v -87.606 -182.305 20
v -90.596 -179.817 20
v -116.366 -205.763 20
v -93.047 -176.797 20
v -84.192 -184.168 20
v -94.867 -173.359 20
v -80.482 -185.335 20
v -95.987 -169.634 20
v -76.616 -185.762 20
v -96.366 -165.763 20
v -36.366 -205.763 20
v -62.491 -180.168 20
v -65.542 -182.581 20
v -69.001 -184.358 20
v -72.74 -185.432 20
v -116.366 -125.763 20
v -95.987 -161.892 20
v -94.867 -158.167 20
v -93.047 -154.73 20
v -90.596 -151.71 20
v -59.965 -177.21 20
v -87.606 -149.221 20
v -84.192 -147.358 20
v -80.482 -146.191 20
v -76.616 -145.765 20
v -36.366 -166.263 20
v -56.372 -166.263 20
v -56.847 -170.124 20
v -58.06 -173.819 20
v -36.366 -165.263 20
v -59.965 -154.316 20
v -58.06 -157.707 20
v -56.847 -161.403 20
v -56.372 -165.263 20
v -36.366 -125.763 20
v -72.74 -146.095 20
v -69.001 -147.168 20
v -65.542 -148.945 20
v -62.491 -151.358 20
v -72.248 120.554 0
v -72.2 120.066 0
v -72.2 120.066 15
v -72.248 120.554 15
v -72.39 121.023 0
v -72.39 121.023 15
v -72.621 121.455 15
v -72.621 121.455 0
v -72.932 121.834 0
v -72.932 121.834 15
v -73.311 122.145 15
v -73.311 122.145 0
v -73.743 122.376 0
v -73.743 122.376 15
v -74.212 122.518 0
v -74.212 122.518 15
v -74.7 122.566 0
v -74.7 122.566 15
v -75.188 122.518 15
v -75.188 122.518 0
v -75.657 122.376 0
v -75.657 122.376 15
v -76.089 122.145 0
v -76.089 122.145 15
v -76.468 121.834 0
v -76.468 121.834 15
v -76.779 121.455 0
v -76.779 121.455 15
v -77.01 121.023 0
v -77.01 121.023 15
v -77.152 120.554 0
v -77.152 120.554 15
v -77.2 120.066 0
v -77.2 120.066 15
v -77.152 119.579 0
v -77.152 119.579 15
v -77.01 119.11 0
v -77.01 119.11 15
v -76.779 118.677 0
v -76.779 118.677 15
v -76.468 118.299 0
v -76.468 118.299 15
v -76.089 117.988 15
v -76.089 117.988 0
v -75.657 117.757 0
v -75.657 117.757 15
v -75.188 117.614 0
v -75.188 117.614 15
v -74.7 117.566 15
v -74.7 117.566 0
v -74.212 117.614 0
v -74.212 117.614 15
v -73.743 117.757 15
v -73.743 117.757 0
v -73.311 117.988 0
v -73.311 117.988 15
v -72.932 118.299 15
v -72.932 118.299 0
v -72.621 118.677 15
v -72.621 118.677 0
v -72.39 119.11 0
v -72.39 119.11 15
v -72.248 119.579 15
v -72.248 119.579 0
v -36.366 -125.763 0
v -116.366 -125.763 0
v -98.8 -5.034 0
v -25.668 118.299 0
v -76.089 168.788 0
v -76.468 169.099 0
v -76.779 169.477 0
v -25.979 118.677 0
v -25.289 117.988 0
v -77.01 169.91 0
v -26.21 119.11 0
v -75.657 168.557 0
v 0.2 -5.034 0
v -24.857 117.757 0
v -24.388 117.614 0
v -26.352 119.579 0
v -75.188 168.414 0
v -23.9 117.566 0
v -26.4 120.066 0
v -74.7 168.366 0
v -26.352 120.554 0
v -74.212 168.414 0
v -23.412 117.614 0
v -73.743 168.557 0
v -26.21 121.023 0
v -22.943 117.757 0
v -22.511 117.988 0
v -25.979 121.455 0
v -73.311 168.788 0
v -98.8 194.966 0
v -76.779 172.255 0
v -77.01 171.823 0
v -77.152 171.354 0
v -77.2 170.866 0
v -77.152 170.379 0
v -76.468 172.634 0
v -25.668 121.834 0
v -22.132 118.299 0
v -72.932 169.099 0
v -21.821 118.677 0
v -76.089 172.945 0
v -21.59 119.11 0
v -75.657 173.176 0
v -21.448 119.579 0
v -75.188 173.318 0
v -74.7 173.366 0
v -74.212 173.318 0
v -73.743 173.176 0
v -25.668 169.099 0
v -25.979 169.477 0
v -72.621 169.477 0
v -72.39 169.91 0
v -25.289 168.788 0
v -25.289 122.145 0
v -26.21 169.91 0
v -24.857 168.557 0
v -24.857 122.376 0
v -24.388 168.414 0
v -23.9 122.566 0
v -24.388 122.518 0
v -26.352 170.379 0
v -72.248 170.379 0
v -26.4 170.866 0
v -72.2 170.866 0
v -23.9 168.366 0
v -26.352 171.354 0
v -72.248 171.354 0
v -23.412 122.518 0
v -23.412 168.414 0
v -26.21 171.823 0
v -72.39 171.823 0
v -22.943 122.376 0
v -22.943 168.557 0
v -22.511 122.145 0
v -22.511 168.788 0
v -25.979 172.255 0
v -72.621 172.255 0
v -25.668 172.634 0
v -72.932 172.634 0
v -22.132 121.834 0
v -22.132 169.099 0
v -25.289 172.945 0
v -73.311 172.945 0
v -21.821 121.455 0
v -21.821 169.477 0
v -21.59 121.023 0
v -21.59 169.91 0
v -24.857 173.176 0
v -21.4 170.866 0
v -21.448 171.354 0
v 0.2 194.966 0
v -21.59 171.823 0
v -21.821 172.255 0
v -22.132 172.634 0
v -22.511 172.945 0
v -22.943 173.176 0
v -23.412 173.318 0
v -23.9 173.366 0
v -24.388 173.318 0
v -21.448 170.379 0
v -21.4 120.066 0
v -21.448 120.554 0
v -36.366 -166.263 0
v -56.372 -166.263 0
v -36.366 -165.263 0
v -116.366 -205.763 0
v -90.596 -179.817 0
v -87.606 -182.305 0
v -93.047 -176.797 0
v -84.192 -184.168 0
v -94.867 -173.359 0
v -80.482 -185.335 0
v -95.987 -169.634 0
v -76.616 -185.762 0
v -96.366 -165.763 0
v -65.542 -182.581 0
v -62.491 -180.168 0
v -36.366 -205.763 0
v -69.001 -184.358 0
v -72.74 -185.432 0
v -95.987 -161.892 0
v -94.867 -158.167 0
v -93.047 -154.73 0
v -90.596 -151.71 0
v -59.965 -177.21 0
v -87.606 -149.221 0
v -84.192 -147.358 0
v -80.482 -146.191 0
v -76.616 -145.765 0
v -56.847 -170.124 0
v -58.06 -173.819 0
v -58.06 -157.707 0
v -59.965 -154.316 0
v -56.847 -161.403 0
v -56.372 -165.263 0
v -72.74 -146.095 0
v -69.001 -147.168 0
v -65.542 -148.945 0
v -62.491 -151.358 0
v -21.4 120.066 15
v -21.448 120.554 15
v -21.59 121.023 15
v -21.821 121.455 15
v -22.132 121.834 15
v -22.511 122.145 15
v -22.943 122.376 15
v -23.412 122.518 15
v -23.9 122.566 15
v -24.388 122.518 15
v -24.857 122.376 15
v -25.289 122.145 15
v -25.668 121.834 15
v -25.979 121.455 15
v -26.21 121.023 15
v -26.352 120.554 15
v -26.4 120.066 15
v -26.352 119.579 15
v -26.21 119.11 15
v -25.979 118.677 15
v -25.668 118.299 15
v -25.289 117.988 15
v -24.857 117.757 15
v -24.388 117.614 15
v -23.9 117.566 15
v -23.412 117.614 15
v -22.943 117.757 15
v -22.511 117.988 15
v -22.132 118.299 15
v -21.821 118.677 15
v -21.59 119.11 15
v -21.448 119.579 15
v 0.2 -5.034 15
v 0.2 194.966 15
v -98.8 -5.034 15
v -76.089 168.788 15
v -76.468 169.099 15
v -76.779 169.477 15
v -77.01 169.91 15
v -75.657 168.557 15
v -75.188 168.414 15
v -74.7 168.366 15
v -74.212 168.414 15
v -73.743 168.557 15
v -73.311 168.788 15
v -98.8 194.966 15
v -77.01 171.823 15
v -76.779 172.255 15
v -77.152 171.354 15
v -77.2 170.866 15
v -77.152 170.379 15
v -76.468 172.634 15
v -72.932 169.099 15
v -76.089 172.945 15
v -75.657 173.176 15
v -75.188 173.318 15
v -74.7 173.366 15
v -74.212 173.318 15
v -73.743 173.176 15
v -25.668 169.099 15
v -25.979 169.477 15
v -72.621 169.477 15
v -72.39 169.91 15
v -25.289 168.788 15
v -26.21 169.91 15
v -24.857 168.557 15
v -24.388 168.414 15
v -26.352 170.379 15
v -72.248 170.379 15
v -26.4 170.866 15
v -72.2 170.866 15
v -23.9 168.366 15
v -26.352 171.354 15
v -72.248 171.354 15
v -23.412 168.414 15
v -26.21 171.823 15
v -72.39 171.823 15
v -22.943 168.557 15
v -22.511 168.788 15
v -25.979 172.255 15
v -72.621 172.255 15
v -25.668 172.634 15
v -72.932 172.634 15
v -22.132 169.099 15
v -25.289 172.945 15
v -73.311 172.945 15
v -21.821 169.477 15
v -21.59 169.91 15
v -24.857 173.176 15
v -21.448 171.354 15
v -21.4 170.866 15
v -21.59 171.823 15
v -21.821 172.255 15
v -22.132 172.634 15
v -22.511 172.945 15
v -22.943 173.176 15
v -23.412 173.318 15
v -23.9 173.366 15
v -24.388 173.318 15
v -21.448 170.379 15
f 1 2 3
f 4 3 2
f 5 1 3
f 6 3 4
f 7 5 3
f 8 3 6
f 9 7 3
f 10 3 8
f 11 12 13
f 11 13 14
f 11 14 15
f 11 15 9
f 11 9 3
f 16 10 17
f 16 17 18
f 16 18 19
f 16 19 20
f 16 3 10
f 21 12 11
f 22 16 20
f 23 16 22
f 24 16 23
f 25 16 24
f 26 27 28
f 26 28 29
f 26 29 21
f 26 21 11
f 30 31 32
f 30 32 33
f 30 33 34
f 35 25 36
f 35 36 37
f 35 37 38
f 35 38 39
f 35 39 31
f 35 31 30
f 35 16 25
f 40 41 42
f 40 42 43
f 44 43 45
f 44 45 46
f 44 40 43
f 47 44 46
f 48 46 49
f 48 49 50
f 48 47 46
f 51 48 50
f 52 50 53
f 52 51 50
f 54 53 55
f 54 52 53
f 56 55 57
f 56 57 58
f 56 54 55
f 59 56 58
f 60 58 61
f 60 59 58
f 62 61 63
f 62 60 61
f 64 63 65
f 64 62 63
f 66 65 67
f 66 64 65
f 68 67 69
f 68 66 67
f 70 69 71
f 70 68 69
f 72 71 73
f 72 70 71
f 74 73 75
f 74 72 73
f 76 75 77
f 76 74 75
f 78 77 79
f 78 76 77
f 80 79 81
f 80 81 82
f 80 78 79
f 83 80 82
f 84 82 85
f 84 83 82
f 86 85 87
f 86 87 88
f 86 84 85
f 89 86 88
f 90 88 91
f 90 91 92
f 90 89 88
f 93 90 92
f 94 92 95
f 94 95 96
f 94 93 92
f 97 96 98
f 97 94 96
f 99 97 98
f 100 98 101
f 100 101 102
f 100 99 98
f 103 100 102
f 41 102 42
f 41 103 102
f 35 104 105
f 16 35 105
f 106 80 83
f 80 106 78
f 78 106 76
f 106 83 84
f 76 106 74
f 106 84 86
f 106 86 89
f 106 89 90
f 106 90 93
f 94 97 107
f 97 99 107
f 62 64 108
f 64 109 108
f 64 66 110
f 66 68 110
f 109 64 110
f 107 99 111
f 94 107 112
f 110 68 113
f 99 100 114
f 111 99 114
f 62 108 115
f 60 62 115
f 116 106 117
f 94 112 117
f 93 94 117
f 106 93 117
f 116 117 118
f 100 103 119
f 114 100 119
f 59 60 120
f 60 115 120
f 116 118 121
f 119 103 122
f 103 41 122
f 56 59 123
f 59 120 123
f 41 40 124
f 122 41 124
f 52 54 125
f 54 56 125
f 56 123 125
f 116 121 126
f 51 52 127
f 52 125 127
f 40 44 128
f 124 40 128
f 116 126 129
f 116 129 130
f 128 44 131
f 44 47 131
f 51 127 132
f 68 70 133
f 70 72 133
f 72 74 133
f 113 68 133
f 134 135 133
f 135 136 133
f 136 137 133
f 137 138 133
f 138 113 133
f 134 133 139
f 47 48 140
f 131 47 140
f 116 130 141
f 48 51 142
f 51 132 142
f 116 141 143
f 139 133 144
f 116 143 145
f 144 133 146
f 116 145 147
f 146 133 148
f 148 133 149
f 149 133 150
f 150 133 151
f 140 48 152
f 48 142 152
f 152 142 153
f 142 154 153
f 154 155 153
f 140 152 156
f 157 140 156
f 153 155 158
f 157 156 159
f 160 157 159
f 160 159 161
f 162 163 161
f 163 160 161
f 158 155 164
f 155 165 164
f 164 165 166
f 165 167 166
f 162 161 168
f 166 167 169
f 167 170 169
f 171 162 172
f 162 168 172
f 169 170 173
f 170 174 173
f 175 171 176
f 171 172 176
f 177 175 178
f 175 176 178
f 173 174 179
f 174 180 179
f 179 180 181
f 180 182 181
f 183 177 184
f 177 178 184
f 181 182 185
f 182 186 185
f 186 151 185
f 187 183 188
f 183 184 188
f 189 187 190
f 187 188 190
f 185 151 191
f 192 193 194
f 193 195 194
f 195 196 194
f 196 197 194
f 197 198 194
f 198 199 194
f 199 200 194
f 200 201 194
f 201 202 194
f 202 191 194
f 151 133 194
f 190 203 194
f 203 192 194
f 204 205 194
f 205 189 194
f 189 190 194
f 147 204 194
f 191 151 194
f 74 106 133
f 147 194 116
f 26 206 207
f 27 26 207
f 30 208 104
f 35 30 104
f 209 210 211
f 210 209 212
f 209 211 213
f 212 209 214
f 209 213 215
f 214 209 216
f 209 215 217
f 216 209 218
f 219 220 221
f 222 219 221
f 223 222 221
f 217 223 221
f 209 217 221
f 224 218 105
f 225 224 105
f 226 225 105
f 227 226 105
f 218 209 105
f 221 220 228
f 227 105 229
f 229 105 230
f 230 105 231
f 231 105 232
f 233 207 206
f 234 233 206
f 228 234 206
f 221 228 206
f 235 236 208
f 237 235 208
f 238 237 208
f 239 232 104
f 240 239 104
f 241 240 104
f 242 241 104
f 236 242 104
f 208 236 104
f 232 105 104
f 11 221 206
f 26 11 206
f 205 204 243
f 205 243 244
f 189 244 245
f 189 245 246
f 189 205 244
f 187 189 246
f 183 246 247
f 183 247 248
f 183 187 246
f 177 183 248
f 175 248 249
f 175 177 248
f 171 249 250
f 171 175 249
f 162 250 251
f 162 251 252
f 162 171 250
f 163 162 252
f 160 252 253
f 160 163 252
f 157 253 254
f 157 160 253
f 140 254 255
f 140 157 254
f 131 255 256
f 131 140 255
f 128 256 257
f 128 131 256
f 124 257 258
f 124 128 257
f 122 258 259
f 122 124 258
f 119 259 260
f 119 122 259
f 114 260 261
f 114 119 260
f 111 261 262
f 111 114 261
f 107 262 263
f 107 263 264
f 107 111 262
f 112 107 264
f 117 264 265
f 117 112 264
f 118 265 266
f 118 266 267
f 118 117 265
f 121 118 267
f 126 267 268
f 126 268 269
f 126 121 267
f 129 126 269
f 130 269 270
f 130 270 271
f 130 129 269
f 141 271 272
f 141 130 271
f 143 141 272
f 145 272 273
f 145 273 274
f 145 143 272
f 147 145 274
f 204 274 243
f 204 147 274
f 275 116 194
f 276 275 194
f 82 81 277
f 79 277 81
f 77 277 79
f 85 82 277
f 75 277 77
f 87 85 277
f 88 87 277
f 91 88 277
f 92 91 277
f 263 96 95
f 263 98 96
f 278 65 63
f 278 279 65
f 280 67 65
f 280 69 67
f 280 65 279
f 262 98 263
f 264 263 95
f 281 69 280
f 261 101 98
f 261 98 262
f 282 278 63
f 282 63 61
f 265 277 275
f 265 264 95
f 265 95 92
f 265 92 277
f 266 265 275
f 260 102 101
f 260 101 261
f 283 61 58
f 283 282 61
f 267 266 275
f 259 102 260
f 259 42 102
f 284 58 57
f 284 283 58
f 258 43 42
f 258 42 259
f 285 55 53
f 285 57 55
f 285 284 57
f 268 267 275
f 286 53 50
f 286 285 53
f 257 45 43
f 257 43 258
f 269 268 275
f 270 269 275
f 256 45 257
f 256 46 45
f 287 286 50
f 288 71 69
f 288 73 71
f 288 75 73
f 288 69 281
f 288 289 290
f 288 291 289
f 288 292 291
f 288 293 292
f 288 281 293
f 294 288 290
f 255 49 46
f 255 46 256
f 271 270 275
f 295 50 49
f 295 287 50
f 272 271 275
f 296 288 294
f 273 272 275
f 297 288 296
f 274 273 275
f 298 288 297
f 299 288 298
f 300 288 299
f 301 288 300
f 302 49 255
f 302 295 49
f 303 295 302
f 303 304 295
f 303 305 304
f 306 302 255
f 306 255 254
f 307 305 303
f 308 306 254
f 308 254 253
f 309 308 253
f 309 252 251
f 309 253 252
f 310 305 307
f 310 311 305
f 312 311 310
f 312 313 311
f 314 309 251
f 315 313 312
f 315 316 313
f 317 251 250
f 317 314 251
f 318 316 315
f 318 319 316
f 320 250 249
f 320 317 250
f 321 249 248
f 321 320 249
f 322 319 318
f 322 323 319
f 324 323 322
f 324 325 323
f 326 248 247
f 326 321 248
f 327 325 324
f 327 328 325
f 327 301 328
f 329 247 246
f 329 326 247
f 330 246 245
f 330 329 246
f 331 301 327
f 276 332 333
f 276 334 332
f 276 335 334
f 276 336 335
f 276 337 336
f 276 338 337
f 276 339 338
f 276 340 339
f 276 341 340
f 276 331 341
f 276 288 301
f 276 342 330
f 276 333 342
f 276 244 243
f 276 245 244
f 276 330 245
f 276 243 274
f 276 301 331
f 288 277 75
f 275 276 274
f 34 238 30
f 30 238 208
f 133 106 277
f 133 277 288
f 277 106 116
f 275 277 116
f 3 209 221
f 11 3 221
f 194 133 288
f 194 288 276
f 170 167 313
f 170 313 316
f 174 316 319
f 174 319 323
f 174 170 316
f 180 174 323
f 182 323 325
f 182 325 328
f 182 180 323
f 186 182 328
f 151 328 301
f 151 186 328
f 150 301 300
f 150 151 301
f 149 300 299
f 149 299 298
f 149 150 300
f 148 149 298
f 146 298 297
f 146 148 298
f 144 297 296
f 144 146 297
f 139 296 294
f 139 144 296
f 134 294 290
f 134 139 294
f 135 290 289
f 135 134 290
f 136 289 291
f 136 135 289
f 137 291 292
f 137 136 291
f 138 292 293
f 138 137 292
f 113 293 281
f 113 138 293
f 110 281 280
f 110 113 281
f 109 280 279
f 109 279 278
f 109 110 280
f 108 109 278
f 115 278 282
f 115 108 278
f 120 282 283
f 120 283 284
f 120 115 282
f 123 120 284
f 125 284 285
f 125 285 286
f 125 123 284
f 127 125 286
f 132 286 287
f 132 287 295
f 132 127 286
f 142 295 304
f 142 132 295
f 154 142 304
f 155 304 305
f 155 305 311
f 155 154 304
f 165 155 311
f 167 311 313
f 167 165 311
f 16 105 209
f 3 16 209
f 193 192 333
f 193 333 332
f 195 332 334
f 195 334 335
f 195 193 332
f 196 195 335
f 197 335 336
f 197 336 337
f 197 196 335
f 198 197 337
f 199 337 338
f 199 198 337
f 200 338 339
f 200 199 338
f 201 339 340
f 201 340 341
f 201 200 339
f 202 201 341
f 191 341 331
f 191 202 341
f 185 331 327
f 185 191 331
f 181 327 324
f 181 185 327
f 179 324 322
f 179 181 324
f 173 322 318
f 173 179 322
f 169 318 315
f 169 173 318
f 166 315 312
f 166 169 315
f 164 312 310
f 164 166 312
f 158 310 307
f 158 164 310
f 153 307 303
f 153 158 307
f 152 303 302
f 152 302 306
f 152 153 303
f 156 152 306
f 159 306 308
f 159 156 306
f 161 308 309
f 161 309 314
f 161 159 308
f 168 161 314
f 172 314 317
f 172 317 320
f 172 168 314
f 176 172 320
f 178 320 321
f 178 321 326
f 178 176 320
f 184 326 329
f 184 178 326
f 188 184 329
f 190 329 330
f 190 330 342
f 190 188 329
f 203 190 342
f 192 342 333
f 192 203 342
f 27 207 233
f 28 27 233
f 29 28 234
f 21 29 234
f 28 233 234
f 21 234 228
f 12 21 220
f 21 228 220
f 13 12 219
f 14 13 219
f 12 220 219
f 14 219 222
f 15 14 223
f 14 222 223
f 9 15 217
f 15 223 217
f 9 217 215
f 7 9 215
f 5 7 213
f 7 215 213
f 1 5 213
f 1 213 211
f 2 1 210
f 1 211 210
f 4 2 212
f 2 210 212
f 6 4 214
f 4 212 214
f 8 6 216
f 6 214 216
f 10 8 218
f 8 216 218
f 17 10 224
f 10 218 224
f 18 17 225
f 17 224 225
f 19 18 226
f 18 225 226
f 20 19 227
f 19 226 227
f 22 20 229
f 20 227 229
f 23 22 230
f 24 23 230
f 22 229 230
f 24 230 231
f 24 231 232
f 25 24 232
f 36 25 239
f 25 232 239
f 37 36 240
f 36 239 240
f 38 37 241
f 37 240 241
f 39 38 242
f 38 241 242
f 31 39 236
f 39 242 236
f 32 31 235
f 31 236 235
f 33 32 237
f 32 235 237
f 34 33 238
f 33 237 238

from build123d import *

# Parameters (mm, degrees)
F0_W     = 99
F0_H     = 200
F0_R     = 2.5
F1_DEPTH = 15
F3_DEPTH = 20


with BuildPart() as f1:
    # F0 (on Top) → F1 (new body)
    with BuildSketch(Plane.XY):
        with Locations((-49.299974, 94.966339)):
            Rectangle(F0_W, F0_H)
        with Locations((-74.699974, 120.066339)):
            Circle(F0_R, mode=Mode.SUBTRACT)
        with Locations((-74.699974, 170.866339)):
            Circle(F0_R, mode=Mode.SUBTRACT)
        with Locations((-23.899974, 120.066339)):
            Circle(F0_R, mode=Mode.SUBTRACT)
        with Locations((-23.899974, 170.866339)):
            Circle(F0_R, mode=Mode.SUBTRACT)
    extrude(amount=F1_DEPTH)


with BuildPart() as f3:
    # F2 (on Top) → F3 (new body)
    with BuildSketch(Plane.XY):
        with BuildLine():
            Line((-36.365502, -125.763206), (-116.365502, -125.763206))
            Line((-116.365502, -125.763206), (-116.365502, -205.763206))
            Line((-116.365502, -205.763206), (-36.365502, -205.763206))
            Line((-36.365502, -205.763206), (-36.365502, -166.263206))
            Line((-36.365502, -166.263206), (-56.371753, -166.263206))
            ThreePointArc((-56.371753, -166.263206), (-96.365502, -165.763206), (-56.371753, -165.263206))
            Line((-56.371753, -165.263206), (-36.365502, -165.263206))
            Line((-36.365502, -165.263206), (-36.365502, -125.763206))
        make_face()
    extrude(amount=F3_DEPTH)


solid = Compound([f1.part, f3.part])
